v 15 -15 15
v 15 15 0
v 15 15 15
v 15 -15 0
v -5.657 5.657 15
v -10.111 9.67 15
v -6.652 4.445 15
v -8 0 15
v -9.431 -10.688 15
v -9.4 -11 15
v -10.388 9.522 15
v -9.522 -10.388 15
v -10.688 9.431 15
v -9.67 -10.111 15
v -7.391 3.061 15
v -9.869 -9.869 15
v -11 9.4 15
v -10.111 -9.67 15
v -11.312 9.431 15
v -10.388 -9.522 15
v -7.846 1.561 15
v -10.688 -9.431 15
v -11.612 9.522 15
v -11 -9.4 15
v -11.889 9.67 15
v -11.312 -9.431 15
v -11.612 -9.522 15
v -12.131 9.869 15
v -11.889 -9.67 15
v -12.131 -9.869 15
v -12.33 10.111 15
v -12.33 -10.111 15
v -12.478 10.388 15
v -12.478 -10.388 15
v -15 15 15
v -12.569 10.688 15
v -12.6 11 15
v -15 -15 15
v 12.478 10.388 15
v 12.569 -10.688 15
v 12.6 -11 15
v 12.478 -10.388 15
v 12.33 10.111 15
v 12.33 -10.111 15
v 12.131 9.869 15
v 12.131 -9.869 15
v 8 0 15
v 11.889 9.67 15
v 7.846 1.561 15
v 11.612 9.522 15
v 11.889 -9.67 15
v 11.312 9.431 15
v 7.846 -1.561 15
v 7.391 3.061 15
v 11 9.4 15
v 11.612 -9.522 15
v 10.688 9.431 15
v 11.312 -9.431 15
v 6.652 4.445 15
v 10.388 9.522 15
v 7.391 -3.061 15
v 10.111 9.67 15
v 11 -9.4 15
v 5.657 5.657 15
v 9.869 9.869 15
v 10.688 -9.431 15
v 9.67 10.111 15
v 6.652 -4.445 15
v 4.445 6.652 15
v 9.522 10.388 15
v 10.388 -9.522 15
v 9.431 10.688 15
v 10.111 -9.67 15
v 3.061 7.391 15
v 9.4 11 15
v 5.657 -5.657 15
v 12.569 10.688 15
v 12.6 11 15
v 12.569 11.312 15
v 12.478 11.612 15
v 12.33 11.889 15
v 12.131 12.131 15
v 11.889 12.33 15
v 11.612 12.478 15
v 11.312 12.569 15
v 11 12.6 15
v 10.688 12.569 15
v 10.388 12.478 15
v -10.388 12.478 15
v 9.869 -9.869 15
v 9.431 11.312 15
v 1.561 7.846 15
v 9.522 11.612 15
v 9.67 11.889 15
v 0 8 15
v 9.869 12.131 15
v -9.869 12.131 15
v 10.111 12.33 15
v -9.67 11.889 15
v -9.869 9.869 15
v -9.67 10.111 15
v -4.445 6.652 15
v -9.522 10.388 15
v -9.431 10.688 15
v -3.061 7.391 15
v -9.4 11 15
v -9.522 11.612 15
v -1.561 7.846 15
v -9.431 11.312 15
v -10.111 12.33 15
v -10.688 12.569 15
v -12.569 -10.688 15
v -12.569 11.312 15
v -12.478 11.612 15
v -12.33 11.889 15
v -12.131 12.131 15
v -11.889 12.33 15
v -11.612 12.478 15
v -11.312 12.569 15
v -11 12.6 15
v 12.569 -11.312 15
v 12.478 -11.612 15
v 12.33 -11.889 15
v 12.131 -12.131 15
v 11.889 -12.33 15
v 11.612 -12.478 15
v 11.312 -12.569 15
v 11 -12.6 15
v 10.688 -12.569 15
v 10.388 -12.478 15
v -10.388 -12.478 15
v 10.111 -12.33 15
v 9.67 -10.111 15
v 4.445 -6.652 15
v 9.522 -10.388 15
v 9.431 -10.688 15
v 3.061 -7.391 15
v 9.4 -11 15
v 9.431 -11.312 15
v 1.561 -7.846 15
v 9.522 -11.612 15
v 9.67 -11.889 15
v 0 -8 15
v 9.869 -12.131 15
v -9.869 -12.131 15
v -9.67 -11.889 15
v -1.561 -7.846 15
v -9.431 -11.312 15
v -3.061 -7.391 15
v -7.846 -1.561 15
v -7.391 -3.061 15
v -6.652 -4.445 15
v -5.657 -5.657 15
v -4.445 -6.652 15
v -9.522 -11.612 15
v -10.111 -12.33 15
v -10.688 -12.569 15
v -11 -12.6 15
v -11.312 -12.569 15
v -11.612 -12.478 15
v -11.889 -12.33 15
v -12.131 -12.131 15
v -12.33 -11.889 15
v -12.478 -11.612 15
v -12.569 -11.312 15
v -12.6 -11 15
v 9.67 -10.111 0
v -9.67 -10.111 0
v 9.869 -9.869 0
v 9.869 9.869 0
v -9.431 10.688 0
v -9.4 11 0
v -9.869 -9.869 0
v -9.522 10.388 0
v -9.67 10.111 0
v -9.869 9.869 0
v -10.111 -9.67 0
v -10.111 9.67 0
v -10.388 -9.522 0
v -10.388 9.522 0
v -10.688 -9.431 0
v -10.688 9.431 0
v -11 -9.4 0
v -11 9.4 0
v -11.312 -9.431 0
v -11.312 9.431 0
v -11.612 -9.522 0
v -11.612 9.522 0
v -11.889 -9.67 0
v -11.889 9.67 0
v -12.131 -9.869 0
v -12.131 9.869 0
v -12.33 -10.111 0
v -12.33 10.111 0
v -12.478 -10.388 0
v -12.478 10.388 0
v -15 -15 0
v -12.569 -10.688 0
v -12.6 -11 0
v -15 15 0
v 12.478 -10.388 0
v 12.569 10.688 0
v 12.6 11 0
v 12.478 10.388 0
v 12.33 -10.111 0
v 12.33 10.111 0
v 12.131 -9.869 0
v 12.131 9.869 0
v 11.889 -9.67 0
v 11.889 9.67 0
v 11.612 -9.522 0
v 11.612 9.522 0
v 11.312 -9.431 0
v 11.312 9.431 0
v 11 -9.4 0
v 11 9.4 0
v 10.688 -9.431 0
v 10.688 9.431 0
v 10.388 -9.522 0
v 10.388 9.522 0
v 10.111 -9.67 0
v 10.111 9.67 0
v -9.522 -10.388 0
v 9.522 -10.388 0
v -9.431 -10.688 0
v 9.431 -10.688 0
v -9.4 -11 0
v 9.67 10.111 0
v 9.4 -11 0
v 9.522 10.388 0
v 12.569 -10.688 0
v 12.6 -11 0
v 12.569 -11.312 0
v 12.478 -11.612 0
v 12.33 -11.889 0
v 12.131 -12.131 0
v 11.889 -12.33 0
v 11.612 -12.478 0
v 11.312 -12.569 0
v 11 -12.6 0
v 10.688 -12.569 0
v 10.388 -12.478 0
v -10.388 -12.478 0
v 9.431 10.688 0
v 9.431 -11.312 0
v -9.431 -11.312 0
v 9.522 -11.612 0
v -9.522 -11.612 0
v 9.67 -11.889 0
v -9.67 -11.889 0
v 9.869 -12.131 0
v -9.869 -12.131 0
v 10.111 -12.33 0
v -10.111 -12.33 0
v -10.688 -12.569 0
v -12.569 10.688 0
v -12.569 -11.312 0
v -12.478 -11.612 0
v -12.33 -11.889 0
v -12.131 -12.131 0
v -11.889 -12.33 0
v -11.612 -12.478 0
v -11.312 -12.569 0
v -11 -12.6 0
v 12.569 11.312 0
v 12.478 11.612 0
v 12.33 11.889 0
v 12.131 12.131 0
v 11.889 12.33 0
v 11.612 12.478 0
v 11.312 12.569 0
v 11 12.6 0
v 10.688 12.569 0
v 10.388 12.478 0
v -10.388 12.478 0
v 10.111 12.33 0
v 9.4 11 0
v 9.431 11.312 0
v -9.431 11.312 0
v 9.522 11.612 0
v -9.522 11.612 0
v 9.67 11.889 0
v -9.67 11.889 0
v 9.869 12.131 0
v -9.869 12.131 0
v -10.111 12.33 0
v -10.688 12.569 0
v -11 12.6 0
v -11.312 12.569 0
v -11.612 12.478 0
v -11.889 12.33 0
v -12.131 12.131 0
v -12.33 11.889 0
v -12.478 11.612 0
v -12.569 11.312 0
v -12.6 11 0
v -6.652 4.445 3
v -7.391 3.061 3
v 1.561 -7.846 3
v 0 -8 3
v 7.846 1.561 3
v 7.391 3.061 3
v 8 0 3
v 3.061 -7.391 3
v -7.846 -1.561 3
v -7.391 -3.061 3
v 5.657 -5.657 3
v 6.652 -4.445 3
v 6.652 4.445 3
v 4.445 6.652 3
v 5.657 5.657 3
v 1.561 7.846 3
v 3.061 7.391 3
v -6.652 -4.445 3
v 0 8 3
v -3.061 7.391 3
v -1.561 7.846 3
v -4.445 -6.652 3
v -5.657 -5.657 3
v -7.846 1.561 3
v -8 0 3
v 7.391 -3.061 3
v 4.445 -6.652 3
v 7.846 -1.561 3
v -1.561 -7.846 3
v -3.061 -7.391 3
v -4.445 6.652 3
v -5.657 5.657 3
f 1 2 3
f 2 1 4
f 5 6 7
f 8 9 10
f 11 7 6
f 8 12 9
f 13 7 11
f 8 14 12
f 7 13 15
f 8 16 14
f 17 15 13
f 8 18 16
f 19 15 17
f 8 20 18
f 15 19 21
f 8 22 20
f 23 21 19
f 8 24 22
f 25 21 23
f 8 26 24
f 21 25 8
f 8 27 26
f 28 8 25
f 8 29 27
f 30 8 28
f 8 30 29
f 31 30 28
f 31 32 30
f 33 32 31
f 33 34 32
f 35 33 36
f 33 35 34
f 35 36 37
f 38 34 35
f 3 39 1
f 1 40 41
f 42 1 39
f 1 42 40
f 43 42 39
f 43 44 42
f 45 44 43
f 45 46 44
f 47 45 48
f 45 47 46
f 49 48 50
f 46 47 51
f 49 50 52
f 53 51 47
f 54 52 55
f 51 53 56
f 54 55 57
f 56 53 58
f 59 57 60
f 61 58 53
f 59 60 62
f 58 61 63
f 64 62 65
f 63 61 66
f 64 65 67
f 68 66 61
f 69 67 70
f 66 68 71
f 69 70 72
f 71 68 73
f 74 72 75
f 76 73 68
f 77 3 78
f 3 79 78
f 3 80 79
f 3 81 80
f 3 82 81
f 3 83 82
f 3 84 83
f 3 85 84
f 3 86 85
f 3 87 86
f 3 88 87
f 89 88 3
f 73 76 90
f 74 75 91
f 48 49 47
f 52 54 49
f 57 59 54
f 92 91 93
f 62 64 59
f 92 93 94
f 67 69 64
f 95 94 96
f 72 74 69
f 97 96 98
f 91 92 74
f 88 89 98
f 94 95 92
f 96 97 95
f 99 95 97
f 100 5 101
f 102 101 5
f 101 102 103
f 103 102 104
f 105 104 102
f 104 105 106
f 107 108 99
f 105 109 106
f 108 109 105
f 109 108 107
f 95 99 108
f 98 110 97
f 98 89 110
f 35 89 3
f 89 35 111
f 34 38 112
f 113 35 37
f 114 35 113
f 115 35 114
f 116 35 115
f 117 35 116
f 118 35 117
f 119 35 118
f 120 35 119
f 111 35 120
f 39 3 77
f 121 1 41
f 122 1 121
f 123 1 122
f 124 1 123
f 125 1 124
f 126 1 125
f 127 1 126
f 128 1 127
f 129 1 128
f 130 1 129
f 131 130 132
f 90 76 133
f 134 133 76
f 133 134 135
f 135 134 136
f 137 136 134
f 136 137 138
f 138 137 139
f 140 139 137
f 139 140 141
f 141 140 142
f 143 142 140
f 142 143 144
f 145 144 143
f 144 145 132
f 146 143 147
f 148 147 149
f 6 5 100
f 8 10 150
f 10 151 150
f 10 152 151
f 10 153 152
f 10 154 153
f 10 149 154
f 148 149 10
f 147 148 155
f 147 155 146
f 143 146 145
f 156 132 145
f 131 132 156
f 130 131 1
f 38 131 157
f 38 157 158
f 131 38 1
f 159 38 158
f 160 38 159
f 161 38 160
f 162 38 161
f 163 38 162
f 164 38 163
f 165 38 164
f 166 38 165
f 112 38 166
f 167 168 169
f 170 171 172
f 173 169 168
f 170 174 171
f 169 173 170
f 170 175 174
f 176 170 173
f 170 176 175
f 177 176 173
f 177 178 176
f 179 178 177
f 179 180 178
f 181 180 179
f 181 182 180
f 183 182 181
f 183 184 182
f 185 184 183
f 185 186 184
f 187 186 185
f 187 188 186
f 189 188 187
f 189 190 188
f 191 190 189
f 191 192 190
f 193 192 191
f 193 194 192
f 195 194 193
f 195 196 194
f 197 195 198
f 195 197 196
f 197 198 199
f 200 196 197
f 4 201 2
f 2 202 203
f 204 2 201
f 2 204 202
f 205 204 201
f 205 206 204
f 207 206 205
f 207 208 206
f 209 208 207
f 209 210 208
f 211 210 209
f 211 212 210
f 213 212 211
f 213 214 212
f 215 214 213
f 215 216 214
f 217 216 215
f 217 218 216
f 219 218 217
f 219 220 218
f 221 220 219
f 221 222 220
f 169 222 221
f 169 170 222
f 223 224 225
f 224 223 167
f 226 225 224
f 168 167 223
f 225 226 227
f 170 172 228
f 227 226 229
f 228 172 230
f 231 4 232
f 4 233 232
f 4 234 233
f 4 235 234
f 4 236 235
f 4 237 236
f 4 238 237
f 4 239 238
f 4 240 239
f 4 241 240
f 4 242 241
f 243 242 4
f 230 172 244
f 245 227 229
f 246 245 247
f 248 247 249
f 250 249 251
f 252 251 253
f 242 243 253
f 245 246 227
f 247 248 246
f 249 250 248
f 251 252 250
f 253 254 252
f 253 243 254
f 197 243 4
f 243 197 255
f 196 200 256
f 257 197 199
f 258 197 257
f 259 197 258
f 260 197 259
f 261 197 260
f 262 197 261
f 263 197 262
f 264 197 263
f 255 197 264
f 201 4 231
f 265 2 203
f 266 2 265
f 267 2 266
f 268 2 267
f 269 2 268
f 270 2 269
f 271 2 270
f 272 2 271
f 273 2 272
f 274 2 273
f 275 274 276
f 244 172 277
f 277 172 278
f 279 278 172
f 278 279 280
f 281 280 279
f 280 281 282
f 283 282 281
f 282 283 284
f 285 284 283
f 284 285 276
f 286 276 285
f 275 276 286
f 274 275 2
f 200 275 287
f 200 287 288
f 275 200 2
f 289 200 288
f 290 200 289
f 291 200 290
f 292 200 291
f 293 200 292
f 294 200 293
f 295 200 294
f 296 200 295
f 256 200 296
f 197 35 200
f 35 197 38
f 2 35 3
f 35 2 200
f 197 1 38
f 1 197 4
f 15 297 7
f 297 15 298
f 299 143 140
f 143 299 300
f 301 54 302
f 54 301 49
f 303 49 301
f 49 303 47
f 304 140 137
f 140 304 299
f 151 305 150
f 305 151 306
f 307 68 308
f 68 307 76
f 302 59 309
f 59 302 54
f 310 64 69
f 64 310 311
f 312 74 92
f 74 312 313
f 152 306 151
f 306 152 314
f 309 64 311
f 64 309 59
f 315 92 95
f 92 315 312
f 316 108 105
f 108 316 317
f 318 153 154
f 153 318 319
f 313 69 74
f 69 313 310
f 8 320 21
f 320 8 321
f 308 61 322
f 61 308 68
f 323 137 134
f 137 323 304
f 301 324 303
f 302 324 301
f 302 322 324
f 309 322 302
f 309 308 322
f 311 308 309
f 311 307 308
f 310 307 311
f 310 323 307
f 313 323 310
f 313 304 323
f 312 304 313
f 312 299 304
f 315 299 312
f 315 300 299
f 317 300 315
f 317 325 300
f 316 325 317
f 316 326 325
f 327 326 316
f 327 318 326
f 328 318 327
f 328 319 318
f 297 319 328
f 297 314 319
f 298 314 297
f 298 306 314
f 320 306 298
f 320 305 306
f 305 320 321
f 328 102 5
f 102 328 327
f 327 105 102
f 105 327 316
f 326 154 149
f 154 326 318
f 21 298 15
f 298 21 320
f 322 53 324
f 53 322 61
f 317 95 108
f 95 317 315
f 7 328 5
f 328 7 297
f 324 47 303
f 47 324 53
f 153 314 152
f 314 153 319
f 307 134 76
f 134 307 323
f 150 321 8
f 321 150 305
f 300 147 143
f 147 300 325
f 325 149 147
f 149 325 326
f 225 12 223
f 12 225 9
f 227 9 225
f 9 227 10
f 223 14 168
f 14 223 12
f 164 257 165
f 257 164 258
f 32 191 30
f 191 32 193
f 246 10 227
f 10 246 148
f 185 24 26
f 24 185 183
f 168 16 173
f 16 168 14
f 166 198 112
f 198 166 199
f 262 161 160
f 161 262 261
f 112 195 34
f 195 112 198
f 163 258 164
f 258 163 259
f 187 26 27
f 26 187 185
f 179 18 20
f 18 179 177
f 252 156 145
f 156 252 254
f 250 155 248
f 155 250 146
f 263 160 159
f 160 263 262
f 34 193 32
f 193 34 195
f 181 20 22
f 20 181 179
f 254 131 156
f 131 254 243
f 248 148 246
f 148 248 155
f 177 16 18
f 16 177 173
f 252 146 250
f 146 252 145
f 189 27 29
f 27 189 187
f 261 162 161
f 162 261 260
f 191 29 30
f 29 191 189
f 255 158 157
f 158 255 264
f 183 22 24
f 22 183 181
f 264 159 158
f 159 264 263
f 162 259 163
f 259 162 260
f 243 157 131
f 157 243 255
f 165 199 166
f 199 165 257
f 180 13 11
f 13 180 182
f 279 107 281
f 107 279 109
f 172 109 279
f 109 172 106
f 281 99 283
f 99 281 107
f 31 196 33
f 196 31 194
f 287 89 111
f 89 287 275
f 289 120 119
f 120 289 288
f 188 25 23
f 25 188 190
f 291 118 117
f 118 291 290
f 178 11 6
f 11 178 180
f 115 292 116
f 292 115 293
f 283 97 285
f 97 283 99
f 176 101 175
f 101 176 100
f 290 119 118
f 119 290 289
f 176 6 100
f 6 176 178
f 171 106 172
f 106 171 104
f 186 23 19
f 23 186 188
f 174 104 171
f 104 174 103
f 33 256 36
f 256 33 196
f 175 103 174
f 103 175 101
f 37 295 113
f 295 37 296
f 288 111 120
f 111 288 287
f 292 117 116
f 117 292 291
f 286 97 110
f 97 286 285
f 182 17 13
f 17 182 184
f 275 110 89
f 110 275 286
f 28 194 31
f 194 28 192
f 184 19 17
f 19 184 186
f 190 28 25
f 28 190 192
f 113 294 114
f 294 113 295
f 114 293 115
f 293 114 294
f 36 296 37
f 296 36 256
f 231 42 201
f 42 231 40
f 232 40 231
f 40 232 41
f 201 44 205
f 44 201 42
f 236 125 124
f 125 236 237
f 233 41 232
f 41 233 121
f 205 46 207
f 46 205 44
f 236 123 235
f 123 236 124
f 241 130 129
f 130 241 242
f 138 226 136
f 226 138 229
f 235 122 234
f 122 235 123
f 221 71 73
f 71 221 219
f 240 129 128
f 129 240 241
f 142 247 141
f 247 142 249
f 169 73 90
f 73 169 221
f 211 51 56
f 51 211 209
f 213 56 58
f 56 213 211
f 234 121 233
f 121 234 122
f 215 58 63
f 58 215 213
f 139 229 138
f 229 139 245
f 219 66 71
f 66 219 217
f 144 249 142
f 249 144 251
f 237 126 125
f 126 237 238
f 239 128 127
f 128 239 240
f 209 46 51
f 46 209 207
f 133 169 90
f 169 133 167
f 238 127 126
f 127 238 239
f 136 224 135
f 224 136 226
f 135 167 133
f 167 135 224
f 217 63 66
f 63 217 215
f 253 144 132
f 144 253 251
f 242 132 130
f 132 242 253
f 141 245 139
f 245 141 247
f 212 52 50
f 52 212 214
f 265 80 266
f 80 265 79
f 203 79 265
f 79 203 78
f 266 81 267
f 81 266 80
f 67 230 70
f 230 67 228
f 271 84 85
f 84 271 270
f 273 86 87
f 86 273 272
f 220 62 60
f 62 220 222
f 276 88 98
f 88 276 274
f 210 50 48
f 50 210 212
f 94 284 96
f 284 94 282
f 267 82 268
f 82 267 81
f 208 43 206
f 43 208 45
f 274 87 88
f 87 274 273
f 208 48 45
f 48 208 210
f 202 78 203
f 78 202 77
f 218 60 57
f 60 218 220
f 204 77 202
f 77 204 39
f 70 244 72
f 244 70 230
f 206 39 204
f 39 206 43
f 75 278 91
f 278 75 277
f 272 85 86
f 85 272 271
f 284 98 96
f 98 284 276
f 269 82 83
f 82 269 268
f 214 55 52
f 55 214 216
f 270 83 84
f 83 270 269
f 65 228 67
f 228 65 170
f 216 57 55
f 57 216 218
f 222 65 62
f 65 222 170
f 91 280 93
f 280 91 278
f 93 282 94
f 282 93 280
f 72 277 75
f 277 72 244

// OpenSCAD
// ====================================================================
// Valve Bracket - Single + Array modes
// ====================================================================
// PURPOSE: Mount solenoid valve (16mm dia) to aluminum frame below cushion
//
// DESIGN (FIXED):
//   - 4 mount holes (M3) are THROUGH-HOLES (visible from both top & bottom)
//   - 1 valve stem hole in CENTER (only top portion, 12mm depth)
//   - Screws can come from either top OR bottom of bracket
//
// USAGE:
//   - Open in OpenSCAD, F5/F6
//   - Customizer -> view_mode:
//       0 = Single bracket (centered at origin)
//       1 = 4x4 array (16 brackets)
// ====================================================================

/* [View] */
view_mode = 0; // [0:Single bracket, 1:4x4 array (16 pieces)]

/* [Bracket dimensions] */
bracket_width = 30;
bracket_depth = 30;
bracket_height = 15;

/* [Holes] */
valve_d = 16;   // valve stem diameter (16mm)
mount_d = 3.2;  // M3 screw clearance (3.2mm)

/* [Render] */
$fn = 32;

// ====================================================================
// SINGLE BRACKET MODULE
// ====================================================================
module valve_bracket() {
    difference() {
        // Main body (centered at origin, from z=0 to z=bracket_height)
        translate([-bracket_width/2, -bracket_depth/2, 0])
            cube([bracket_width, bracket_depth, bracket_height]);
        
        // === CENTRAL VALVE STEM HOLE ===
        // From z=3 (above base) to z=bracket_height (top)
        // This is where the valve sits - only TOP portion is hollow
        translate([0, 0, 3])
            cylinder(d=valve_d, h=bracket_height);
        
        // === 4 MOUNT HOLES (M3) - THROUGH-HOLES ===
        // From z=-1 (below base) to z=bracket_height+1 (above top)
        // Visible from BOTH top and bottom
        translate([-bracket_width/2 + 4, -bracket_depth/2 + 4, -1])
            cylinder(d=mount_d, h=bracket_height + 2);
        translate([-bracket_width/2 + 4,  bracket_depth/2 - 4, -1])
            cylinder(d=mount_d, h=bracket_height + 2);
        translate([ bracket_width/2 - 4, -bracket_depth/2 + 4, -1])
            cylinder(d=mount_d, h=bracket_height + 2);
        translate([ bracket_width/2 - 4,  bracket_depth/2 - 4, -1])
            cylinder(d=mount_d, h=bracket_height + 2);
    }
}

// ====================================================================
// TOP-LEVEL RENDER
// ====================================================================
if (view_mode == 0) {
    // SINGLE - centered at origin
    color("#37474F") valve_bracket();
}
if (view_mode == 1) {
    // 4x4 ARRAY - 16 pieces
    color("#37474F")
    for (r = [0, 1, 2, 3])
    for (c = [0, 1, 2, 3])
        translate([(c - 1.5) * 40, (r - 1.5) * 40, 0])
            valve_bracket();
}
